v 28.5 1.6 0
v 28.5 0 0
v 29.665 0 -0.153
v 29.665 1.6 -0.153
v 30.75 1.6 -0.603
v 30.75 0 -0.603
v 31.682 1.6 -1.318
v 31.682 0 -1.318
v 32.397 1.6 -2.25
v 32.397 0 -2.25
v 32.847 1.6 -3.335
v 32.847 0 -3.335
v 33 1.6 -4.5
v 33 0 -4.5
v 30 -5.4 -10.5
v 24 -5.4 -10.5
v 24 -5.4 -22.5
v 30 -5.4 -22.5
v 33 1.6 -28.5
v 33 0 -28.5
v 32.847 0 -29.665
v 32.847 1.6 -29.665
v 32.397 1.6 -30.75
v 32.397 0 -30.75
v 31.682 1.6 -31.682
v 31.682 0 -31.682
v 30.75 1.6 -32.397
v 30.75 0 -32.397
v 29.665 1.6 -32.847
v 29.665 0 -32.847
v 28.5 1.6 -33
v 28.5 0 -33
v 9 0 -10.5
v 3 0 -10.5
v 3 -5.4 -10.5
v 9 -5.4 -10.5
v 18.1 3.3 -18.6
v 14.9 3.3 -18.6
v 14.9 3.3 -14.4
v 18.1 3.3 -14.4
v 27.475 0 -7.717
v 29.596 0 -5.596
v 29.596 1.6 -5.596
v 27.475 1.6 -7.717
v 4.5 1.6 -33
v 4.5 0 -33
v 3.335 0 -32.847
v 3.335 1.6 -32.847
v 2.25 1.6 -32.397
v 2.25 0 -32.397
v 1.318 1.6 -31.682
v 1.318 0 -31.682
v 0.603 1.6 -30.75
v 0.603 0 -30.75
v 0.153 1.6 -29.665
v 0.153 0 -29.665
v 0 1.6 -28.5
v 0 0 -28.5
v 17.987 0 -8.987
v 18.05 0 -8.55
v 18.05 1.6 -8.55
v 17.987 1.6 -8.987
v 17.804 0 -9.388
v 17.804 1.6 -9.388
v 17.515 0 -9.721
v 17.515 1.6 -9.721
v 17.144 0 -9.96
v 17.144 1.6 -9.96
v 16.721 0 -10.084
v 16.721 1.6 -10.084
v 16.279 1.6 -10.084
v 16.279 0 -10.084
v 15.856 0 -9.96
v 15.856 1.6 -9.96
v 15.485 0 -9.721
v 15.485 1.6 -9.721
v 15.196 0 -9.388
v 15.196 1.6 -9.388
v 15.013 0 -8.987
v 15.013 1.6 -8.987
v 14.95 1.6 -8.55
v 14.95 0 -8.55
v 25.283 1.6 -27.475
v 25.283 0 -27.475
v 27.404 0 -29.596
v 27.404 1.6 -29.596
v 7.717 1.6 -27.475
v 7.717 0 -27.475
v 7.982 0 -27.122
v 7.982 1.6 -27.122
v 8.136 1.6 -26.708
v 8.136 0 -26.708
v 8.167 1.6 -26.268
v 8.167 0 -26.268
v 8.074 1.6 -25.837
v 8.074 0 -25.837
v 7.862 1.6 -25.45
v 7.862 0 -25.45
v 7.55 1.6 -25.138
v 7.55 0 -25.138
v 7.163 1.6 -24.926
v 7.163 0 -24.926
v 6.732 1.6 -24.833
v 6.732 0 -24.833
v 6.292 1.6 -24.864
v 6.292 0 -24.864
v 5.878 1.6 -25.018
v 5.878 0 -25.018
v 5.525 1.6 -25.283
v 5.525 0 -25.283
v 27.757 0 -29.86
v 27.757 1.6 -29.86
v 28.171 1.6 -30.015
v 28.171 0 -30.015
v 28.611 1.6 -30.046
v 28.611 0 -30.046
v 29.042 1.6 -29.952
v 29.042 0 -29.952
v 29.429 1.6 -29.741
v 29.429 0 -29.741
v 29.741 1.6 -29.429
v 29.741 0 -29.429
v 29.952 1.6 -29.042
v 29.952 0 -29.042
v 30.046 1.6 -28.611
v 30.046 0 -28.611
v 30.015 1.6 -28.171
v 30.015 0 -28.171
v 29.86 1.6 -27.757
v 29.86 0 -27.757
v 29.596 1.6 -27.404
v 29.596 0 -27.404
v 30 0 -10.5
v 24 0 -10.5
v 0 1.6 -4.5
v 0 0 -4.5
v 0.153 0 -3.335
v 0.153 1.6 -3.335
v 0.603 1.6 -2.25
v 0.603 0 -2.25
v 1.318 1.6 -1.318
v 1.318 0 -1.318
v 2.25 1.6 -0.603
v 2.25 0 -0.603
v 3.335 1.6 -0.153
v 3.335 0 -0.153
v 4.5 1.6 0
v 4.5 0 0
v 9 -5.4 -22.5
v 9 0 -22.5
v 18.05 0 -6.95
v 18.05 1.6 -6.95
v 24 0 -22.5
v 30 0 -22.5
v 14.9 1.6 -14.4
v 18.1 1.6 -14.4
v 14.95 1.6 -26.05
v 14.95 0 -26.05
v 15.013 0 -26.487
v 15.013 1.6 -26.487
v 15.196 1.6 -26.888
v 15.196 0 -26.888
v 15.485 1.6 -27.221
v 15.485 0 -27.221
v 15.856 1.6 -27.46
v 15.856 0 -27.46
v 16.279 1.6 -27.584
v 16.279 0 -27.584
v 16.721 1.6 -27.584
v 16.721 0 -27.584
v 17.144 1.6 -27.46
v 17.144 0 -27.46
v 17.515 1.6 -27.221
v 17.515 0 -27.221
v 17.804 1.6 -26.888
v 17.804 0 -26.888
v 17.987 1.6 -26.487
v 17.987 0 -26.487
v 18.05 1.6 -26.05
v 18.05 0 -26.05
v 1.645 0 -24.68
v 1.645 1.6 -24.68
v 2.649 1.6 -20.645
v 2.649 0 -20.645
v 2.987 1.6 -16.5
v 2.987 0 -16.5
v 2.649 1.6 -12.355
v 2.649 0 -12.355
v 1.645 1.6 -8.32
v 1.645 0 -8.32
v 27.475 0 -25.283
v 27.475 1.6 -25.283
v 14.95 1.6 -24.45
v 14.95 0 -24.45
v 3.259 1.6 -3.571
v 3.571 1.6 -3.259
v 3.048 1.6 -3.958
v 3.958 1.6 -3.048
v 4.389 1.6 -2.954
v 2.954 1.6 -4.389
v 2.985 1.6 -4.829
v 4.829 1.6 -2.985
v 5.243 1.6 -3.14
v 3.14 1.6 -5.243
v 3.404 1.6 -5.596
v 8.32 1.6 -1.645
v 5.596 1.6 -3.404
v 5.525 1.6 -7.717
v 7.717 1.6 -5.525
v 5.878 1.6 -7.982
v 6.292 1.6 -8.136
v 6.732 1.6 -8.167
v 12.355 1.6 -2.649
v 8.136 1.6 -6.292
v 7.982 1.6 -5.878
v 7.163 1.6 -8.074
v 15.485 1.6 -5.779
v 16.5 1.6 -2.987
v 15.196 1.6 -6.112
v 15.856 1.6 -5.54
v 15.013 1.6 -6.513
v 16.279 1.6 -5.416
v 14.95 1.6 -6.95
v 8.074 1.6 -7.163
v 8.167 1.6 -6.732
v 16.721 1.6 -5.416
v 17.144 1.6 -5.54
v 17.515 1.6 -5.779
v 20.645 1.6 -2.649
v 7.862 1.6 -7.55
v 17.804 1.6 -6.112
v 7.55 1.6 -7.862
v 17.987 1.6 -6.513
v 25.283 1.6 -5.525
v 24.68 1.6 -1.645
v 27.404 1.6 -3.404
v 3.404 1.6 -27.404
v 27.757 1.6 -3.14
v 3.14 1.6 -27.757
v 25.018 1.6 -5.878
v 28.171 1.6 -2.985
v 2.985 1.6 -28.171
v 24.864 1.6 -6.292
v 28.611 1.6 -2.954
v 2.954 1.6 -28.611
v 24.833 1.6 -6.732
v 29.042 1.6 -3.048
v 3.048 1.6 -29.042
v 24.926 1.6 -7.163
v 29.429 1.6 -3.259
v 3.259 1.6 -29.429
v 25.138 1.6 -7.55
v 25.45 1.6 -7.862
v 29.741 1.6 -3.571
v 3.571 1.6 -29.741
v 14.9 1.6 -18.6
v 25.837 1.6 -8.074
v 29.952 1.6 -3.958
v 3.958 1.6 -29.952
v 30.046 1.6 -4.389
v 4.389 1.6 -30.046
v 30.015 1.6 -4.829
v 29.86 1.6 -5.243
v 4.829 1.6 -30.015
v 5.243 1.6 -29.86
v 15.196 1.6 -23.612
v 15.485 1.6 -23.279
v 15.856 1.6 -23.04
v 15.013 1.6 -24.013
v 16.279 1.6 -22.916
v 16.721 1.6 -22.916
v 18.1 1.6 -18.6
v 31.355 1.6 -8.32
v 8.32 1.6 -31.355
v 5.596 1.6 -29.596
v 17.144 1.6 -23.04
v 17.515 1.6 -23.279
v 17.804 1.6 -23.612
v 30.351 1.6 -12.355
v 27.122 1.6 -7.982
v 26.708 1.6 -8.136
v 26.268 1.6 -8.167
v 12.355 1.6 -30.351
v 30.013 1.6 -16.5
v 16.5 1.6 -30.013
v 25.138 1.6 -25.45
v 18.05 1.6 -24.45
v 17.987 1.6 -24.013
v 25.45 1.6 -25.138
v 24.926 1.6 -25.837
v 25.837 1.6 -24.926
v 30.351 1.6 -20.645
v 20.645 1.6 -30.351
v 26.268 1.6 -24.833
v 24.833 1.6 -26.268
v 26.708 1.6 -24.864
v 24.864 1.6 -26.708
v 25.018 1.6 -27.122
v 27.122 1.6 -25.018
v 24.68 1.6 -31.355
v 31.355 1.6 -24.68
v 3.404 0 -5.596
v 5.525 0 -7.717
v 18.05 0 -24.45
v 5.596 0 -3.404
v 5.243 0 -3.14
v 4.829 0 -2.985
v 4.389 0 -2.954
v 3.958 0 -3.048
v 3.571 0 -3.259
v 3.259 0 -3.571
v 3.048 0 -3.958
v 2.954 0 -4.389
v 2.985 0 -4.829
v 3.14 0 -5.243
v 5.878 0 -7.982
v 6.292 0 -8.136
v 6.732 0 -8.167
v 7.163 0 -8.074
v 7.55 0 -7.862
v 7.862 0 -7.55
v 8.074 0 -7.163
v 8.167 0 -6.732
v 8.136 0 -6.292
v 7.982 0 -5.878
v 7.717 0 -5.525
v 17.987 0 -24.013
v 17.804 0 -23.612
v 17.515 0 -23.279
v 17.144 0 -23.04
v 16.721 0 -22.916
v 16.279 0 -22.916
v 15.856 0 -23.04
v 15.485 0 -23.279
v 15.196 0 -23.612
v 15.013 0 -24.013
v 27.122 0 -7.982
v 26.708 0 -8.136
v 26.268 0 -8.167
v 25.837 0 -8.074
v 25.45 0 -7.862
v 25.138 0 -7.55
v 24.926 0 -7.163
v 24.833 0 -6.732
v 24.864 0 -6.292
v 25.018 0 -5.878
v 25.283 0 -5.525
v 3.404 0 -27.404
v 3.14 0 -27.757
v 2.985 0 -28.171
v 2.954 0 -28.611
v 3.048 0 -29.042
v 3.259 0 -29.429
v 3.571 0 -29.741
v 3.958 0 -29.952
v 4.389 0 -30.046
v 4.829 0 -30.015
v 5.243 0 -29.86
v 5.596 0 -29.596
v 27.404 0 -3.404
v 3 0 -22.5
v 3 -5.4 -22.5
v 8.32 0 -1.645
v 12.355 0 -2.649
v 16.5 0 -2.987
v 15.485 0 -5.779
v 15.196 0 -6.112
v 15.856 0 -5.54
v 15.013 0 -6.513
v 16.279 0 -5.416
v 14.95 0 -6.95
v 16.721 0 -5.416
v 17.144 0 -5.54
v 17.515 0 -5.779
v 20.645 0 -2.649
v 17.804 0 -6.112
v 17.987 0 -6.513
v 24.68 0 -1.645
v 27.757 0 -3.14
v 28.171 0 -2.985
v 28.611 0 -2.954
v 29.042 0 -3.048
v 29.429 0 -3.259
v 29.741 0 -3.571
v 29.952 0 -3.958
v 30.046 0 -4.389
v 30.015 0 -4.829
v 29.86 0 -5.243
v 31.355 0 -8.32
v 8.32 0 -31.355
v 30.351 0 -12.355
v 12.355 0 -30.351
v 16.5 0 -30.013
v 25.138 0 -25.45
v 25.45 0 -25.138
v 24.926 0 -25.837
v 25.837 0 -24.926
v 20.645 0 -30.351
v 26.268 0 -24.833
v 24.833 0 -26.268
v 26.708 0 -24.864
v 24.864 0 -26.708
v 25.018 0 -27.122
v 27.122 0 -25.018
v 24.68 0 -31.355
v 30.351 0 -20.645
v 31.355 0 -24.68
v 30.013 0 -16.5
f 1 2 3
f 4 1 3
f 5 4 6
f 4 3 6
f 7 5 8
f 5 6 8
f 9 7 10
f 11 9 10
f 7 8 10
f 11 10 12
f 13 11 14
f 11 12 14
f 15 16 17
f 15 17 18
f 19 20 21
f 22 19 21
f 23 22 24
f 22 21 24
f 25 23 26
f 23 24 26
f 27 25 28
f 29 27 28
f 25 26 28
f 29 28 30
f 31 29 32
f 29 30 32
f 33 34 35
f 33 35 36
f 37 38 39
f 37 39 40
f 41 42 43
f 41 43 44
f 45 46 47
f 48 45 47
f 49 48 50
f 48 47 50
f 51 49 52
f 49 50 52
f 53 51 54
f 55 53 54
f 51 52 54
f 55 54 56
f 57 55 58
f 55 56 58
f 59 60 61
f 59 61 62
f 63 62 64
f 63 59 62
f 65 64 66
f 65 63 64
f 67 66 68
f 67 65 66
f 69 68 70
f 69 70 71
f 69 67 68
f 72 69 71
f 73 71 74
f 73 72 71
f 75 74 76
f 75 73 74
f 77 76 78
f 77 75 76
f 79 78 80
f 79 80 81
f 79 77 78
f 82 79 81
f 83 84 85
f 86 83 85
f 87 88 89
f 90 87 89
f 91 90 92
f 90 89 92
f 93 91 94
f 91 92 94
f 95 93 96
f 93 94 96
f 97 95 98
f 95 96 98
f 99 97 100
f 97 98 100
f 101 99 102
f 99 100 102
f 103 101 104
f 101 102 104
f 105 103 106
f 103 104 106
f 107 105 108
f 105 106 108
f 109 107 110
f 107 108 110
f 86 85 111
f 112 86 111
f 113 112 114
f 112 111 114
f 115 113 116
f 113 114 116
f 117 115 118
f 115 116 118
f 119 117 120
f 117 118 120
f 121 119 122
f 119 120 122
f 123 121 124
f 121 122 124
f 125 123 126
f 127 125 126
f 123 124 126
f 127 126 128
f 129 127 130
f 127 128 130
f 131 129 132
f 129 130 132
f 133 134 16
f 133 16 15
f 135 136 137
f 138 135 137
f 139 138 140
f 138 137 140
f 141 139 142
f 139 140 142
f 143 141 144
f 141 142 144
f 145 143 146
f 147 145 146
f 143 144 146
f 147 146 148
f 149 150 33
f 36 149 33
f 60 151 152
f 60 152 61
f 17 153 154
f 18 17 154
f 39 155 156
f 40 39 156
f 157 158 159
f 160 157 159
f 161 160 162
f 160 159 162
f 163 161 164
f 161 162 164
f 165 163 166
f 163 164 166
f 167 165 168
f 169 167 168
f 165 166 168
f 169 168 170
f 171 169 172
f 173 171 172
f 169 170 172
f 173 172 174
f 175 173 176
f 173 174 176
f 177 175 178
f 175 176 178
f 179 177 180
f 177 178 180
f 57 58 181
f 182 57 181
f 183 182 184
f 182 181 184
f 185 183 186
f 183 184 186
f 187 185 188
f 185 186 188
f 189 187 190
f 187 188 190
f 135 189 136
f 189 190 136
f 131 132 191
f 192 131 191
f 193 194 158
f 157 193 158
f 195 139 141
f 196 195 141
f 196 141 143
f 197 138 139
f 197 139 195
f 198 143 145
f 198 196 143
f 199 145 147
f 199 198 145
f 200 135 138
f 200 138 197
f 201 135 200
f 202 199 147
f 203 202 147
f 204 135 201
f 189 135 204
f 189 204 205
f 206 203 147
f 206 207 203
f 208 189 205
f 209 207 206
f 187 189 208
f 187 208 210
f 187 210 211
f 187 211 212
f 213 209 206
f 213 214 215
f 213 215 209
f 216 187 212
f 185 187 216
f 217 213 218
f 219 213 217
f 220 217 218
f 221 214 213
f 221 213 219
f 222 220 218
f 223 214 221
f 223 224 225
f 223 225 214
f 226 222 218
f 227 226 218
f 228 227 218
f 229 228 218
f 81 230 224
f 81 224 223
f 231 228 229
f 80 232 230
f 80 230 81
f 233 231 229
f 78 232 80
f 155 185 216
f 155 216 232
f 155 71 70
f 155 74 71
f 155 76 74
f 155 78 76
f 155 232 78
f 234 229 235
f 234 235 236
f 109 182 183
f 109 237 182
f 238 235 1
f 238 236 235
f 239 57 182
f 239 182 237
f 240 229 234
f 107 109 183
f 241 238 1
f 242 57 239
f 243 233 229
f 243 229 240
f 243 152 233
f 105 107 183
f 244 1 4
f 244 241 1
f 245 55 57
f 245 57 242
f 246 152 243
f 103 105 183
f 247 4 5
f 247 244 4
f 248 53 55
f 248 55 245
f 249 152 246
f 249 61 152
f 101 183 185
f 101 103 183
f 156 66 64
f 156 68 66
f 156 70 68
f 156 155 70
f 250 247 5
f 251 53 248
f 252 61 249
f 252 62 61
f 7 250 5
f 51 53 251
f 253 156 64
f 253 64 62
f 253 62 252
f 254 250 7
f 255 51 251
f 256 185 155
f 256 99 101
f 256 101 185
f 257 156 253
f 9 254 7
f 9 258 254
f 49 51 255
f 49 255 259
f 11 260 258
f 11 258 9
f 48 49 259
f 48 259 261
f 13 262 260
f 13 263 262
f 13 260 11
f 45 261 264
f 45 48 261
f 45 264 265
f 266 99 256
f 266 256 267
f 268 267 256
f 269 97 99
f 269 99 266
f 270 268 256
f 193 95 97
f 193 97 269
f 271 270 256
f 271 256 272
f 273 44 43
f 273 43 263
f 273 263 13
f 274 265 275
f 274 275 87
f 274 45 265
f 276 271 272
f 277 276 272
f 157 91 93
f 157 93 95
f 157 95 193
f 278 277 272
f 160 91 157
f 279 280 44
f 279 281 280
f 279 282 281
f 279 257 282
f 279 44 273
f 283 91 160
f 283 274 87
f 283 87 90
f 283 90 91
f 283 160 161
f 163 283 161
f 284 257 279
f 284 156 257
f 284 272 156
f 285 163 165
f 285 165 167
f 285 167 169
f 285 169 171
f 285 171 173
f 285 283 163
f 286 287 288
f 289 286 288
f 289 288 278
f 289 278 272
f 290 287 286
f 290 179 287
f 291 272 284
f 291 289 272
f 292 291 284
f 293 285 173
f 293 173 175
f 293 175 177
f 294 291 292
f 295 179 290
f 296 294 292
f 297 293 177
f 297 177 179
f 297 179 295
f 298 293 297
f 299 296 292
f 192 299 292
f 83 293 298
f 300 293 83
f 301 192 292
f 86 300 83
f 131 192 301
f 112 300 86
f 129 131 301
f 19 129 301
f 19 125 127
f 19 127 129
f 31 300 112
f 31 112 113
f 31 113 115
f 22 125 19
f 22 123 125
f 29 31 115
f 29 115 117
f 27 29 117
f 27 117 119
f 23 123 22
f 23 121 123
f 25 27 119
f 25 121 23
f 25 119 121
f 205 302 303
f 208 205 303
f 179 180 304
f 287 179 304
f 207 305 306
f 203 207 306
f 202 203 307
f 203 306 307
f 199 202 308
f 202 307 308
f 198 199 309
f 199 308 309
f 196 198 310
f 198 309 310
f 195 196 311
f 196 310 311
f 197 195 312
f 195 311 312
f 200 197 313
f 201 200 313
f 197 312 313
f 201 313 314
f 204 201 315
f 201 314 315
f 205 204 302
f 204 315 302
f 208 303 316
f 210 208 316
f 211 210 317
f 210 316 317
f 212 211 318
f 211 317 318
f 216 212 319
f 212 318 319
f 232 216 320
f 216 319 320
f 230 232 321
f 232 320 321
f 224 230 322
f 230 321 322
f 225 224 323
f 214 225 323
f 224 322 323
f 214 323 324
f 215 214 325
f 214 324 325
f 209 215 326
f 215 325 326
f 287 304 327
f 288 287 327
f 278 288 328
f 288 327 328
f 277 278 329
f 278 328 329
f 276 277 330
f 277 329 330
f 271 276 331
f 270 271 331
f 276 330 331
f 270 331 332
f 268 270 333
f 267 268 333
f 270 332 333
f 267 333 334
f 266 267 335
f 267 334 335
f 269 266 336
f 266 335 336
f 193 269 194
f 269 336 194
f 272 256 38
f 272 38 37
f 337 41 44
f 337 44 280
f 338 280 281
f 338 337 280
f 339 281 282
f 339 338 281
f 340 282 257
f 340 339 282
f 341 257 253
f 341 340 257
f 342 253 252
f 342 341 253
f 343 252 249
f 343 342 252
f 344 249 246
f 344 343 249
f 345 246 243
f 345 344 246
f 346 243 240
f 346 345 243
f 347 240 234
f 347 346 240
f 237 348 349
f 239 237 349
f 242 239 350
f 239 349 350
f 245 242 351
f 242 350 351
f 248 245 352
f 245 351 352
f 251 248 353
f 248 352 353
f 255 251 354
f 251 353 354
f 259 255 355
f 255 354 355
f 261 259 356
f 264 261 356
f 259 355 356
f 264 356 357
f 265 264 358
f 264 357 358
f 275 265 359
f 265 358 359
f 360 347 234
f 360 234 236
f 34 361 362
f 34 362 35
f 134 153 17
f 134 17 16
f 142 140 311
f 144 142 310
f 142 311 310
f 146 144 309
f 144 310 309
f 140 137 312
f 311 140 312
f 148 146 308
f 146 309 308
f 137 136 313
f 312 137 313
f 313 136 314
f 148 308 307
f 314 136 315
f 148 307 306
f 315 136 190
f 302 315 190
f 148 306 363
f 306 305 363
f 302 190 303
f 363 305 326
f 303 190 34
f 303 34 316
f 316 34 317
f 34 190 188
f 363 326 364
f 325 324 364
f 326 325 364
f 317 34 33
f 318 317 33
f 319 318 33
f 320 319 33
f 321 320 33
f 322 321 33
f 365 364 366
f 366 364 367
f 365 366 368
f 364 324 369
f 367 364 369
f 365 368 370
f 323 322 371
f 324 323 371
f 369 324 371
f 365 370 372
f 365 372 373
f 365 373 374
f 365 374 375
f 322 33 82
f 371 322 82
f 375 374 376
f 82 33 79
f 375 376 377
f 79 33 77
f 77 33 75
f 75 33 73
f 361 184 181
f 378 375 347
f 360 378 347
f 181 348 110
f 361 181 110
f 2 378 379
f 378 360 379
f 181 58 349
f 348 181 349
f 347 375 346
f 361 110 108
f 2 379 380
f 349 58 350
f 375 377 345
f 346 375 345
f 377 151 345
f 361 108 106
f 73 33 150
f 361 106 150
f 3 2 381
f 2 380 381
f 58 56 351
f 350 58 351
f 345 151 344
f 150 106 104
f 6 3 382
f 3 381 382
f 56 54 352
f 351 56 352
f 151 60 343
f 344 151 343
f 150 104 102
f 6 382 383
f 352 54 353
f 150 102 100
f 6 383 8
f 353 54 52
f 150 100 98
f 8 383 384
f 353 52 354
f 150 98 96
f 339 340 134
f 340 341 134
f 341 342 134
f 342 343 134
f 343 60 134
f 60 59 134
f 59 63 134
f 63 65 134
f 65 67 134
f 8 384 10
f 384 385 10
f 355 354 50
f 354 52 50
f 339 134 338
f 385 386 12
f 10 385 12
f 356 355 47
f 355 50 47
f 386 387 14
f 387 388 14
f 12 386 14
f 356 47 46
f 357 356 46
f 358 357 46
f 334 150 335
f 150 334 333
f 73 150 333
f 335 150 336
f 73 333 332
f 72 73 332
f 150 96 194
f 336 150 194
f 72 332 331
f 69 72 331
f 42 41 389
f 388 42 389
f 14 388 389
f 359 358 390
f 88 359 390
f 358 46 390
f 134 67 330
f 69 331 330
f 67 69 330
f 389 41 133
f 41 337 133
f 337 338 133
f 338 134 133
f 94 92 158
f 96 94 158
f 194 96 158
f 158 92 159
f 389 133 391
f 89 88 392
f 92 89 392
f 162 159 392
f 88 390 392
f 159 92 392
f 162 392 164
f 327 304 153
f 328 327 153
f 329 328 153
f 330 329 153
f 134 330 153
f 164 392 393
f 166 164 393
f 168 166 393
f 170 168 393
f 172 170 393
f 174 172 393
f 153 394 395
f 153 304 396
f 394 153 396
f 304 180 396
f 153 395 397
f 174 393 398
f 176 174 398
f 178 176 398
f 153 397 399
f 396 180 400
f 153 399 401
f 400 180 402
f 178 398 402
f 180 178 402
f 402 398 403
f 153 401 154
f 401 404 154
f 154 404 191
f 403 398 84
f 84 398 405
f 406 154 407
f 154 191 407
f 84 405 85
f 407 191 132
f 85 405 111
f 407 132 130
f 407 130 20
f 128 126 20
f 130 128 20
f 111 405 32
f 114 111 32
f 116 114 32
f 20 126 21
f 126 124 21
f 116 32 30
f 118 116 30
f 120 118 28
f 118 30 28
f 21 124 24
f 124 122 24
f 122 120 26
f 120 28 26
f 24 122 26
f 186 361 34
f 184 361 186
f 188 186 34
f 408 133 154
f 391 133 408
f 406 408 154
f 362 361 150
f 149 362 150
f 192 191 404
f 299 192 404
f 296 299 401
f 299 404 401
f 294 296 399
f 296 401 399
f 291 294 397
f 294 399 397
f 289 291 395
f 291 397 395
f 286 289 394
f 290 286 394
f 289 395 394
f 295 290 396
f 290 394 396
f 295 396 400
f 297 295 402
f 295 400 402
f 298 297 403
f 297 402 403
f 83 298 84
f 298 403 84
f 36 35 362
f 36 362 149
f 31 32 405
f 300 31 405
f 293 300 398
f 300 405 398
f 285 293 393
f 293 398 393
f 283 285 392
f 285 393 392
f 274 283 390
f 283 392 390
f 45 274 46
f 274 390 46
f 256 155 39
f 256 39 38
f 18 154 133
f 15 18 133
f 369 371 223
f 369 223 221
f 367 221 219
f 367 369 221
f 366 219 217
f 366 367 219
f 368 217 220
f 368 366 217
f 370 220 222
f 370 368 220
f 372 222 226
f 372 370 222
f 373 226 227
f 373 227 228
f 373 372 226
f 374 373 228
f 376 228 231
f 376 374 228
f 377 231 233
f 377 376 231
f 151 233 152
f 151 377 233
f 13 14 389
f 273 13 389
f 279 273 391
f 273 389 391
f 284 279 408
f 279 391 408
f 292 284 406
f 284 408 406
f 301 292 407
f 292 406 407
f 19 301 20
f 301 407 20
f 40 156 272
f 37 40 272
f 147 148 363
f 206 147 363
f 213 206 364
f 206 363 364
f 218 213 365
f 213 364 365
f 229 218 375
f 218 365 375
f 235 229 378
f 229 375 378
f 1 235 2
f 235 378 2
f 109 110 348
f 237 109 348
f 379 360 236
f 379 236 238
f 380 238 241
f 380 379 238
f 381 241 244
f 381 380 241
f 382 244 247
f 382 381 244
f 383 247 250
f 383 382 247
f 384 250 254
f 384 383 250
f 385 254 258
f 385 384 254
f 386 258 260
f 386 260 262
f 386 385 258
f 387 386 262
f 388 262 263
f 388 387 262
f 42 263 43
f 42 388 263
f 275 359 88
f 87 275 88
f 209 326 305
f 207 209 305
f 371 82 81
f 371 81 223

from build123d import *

# Parameters (mm, degrees)
BOSS_EXTRUDE1_DEPTH = 1.6
SKETCH2_W           = 3.2
SKETCH2_H           = 4.2
BOSS_EXTRUDE2_DEPTH = 1.7
SKETCH3_W           = 6
SKETCH3_H           = 12
BOSS_EXTRUDE3_DEPTH = 5.4


with BuildPart() as part:
    # Sketch1 → Boss-Extrude1 (new body)
    with BuildSketch(Plane(origin=(0, 0, 0), x_dir=(1, 0, 0), z_dir=(0, 1, 0))):
        with BuildLine():
            ThreePointArc((0, 4.5), (1.318019485, 1.318019485), (4.5, 0))
            ThreePointArc((4.5, 0), (16.5, 2.98672956), (28.5, 0))
            ThreePointArc((28.5, 0), (31.681980515, 1.318019485), (33, 4.5))
            ThreePointArc((33, 4.5), (30.01327044, 16.5), (33, 28.5))
            ThreePointArc((33, 28.5), (31.681980515, 31.681980515), (28.5, 33))
            ThreePointArc((28.5, 33), (16.5, 30.01327044), (4.5, 33))
            ThreePointArc((4.5, 33), (1.318019485, 31.681980515), (0, 28.5))
            ThreePointArc((0, 28.5), (2.98672956, 16.5), (0, 4.5))
        make_face()
        with BuildLine():
            Line((18.05, 26.05), (18.05, 24.45))
            ThreePointArc((18.05, 24.45), (16.5, 22.9), (14.95, 24.45))
            Line((14.95, 24.45), (14.95, 26.05))
            ThreePointArc((14.95, 26.05), (16.5, 27.6), (18.05, 26.05))
        make_face(mode=Mode.SUBTRACT)
        with BuildLine():
            Line((3.403984489, 5.596015511), (5.525304833, 7.717335854))
            ThreePointArc((5.525304833, 7.717335854), (7.717335854, 7.717335854), (7.717335854, 5.525304833))
            Line((7.717335854, 5.525304833), (5.596015511, 3.403984489))
            ThreePointArc((5.596015511, 3.403984489), (3.403984489, 3.403984489), (3.403984489, 5.596015511))
        make_face(mode=Mode.SUBTRACT)
        with BuildLine():
            Line((29.596015511, 5.596015511), (27.474695167, 7.717335854))
            ThreePointArc((27.474695167, 7.717335854), (25.282664146, 7.717335854), (25.282664146, 5.525304833))
            Line((25.282664146, 5.525304833), (27.403984489, 3.403984489))
            ThreePointArc((27.403984489, 3.403984489), (29.596015511, 3.403984489), (29.596015511, 5.596015511))
        make_face(mode=Mode.SUBTRACT)
        with BuildLine():
            Line((18.05, 6.95), (18.05, 8.55))
            ThreePointArc((18.05, 8.55), (16.5, 10.1), (14.95, 8.55))
            Line((14.95, 8.55), (14.95, 6.95))
            ThreePointArc((14.95, 6.95), (16.5, 5.4), (18.05, 6.95))
        make_face(mode=Mode.SUBTRACT)
        with BuildLine():
            Line((5.596015511, 29.596015511), (7.717335854, 27.474695167))
            ThreePointArc((7.717335854, 27.474695167), (7.717335854, 25.282664146), (5.525304833, 25.282664146))
            Line((5.525304833, 25.282664146), (3.403984489, 27.403984489))
            ThreePointArc((3.403984489, 27.403984489), (3.403984489, 29.596015511), (5.596015511, 29.596015511))
        make_face(mode=Mode.SUBTRACT)
        with BuildLine():
            Line((25.282664146, 27.474695167), (27.403984489, 29.596015511))
            ThreePointArc((27.403984489, 29.596015511), (29.596015511, 29.596015511), (29.596015511, 27.403984489))
            Line((29.596015511, 27.403984489), (27.474695167, 25.282664146))
            ThreePointArc((27.474695167, 25.282664146), (25.282664146, 25.282664146), (25.282664146, 27.474695167))
        make_face(mode=Mode.SUBTRACT)
    extrude(amount=BOSS_EXTRUDE1_DEPTH)

    # Sketch2 → Boss-Extrude2 (add)
    with BuildSketch(Plane(origin=(0, 1.6, 0), x_dir=(1, 0, 0), z_dir=(0, 1, 0))):
        with Locations((16.5, 16.5)):
            Rectangle(SKETCH2_W, SKETCH2_H)
    extrude(amount=BOSS_EXTRUDE2_DEPTH)

    # Sketch3 → Boss-Extrude3 (add)
    with BuildSketch(Plane.XZ):
        with Locations((6, -16.5)):
            Rectangle(SKETCH3_W, SKETCH3_H)
        with Locations((27, -16.5)):
            Rectangle(SKETCH3_W, SKETCH3_H)
    extrude(amount=BOSS_EXTRUDE3_DEPTH)


solid = part.part
